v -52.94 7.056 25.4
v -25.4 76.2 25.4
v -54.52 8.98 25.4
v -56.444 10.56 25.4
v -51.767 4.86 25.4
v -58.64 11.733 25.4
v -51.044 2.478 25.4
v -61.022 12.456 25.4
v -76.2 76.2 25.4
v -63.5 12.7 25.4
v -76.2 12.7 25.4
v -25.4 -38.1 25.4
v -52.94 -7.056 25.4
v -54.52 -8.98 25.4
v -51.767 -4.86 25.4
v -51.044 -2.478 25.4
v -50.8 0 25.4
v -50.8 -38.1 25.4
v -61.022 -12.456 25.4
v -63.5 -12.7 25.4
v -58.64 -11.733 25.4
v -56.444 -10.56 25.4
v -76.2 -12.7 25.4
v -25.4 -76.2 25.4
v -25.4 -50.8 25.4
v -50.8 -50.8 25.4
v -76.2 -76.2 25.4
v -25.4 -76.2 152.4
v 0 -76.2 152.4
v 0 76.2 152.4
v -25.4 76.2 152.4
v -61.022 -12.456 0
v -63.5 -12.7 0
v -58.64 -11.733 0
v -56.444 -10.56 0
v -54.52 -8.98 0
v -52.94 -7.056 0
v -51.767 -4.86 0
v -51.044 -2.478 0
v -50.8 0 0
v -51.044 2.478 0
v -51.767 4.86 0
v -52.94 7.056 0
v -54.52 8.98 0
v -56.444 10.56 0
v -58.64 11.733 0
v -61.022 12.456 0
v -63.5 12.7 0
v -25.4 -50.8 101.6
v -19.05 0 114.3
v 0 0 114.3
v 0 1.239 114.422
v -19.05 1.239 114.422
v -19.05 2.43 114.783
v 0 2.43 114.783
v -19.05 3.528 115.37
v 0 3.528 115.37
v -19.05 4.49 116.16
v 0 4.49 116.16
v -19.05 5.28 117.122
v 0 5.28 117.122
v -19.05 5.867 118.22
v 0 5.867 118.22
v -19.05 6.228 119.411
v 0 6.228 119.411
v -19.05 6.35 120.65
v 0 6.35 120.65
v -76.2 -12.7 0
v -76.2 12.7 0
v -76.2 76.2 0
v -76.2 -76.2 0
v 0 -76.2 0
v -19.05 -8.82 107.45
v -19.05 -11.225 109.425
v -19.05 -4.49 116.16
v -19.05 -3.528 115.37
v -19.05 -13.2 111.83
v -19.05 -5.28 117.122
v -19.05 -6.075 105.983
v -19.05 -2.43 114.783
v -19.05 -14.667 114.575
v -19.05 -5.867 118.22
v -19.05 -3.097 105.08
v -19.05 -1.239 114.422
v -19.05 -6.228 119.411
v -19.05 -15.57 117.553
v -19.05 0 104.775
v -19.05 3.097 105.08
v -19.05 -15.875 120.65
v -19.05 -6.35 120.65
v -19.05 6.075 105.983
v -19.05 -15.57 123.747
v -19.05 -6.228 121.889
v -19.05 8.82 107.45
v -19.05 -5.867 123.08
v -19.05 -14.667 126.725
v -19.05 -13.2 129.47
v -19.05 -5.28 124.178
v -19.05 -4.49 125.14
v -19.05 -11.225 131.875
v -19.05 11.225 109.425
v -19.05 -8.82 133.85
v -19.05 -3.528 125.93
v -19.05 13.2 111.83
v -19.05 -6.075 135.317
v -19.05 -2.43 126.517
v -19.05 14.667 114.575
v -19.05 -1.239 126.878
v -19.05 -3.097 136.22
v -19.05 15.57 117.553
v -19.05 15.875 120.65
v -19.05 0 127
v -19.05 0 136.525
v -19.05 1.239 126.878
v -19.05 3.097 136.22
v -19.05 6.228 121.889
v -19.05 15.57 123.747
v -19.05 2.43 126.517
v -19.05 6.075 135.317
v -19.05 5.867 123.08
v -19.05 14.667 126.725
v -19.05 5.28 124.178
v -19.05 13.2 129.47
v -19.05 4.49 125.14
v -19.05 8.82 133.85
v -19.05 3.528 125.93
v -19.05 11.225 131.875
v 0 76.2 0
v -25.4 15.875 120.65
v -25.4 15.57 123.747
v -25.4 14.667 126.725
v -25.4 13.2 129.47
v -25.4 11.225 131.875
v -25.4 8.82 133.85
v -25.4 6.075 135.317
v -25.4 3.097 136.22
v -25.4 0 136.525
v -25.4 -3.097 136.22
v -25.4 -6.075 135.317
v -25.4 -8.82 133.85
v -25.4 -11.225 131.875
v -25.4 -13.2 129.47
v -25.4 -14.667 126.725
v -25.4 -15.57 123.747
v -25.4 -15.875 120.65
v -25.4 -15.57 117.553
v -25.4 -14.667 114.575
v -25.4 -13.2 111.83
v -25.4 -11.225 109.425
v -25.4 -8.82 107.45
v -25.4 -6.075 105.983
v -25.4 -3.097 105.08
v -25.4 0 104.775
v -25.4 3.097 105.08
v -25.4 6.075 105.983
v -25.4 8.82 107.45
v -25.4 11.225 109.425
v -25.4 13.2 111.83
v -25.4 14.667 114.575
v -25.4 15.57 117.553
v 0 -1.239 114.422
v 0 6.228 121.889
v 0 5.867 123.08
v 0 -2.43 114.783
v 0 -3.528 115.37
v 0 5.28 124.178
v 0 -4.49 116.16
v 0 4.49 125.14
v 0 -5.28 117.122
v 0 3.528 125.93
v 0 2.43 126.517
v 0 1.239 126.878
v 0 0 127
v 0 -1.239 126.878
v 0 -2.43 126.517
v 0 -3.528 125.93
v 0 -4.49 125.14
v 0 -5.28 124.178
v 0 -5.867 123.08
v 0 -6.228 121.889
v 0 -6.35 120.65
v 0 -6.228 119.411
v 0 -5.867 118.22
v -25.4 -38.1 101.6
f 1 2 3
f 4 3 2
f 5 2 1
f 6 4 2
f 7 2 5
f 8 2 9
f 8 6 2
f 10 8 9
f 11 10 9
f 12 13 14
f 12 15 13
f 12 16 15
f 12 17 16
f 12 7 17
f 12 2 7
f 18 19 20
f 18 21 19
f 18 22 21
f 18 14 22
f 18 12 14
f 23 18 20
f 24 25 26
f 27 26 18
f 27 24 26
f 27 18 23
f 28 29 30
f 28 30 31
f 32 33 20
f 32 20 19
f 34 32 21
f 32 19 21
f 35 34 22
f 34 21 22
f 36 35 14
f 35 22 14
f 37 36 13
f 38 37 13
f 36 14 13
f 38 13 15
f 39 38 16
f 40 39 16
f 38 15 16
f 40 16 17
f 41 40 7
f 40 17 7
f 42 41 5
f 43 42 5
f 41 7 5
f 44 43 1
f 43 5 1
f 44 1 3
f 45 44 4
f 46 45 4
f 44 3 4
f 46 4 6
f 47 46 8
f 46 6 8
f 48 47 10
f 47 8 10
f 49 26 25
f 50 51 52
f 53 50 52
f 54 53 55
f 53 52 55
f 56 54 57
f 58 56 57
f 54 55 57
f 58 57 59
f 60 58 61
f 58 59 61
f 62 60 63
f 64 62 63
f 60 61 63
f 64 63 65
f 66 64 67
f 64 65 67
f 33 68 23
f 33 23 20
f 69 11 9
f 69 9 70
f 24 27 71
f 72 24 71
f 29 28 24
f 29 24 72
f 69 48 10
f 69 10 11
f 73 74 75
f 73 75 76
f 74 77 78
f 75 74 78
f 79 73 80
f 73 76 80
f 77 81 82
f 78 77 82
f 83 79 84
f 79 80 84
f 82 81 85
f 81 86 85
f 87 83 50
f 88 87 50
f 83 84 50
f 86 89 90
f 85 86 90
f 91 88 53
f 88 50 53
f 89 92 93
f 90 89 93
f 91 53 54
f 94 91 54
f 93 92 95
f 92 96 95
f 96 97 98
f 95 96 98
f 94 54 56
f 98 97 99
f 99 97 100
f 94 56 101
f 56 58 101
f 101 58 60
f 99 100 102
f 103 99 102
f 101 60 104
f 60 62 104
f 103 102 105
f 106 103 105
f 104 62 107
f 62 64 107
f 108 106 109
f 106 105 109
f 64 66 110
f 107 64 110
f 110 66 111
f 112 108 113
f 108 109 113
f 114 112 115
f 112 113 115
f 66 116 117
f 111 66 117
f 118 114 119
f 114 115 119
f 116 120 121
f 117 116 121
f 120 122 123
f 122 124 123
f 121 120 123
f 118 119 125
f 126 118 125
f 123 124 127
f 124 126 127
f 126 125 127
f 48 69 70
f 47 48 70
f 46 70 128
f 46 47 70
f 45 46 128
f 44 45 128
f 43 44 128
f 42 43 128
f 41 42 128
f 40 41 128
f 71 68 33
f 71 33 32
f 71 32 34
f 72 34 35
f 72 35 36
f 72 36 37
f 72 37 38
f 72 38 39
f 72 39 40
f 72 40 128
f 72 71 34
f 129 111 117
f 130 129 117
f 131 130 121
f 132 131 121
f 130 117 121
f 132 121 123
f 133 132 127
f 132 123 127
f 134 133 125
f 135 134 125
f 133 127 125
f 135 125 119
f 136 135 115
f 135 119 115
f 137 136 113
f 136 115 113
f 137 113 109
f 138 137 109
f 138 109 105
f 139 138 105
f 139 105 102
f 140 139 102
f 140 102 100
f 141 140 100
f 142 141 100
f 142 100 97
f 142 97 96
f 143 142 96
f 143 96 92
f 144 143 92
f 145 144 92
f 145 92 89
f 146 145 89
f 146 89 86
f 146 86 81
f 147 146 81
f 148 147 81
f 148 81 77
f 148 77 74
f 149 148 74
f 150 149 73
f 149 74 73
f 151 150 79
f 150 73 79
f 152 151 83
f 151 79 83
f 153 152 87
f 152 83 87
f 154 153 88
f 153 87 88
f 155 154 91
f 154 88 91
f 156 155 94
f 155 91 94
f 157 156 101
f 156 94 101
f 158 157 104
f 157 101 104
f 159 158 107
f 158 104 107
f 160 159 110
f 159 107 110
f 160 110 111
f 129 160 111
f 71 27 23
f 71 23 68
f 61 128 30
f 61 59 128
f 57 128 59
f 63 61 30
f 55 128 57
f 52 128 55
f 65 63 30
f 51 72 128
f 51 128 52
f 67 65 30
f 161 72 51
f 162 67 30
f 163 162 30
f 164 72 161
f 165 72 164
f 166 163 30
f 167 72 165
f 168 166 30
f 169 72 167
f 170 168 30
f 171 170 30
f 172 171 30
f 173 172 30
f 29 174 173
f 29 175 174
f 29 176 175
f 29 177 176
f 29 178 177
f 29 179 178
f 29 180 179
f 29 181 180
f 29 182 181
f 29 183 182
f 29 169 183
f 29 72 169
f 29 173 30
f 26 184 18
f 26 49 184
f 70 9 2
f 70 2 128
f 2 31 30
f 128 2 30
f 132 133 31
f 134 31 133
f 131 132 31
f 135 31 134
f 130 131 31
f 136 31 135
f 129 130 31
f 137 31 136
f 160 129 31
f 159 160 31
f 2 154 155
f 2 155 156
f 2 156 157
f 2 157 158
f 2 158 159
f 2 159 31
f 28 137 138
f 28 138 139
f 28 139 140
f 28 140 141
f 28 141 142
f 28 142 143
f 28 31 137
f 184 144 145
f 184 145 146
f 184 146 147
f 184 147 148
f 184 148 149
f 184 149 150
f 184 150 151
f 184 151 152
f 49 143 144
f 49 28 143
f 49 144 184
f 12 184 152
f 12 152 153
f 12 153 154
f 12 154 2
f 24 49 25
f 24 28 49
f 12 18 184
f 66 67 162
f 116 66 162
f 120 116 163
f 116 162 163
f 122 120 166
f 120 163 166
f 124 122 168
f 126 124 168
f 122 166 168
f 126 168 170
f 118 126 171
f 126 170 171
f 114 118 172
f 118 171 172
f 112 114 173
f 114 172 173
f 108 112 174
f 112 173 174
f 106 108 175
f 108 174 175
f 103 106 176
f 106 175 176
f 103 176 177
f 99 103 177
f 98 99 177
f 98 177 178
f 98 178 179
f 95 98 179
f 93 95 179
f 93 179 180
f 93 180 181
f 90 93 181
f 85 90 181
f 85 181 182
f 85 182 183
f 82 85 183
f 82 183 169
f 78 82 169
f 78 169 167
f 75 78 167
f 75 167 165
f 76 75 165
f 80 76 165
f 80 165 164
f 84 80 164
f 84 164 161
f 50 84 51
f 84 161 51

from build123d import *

# Parameters (mm, degrees)
F1_DEPTH      = 76.2
F3_DEPTH      = 25.4
F3_DEPTH_BACK = 25.4
F5_START      = -19.05
F4_R          = 15.875
F5_DEPTH      = 15.494
F7_DEPTH      = 25.908
F10_DEPTH     = 6.35


with BuildPart() as f1:
    # F0 (on Front) → F1 (new body, symmetric)
    with BuildSketch(Plane.XZ):
        Polygon((-76.2, 0), (0, 0), (0, 152.4), (-25.4, 152.4), (-25.4, 25.4), (-76.2, 25.4), align=None)
    extrude(amount=F1_DEPTH, both=True)

    # F2 (on Right) → F3 (cut, two sides)
    with BuildSketch(Plane.YZ) as f3_sk:
        with BuildLine():
            ThreePointArc((0, 114.3), (4.4901280605, 116.1598719395), (6.35, 120.65))
            ThreePointArc((6.35, 120.65), (-4.4901280605, 125.1401280605), (0, 114.3))
        make_face()
    extrude(amount=-F3_DEPTH, mode=Mode.SUBTRACT)
    extrude(f3_sk.sketch, amount=F3_DEPTH_BACK, mode=Mode.SUBTRACT)

    # F4 (on Right) → F5 (cut)
    with BuildSketch(Plane.YZ.offset(F5_START)):
        with Locations((0, 120.65)):
            Circle(F4_R)
    extrude(amount=-F5_DEPTH, mode=Mode.SUBTRACT)

    # F6 (on Top) → F7 (cut, symmetric)
    with BuildSketch(Plane.XY):
        with BuildLine():
            Line((-76.2, 12.7), (-76.2, 0))
            Line((-76.2, 0), (-76.2, -12.7))
            Line((-76.2, -12.7), (-63.5, -12.7))
            ThreePointArc((-63.5, -12.7), (-50.8, 0), (-63.5, 12.7))
            Line((-63.5, 12.7), (-76.2, 12.7))
        make_face()
    extrude(amount=F7_DEPTH, both=True, mode=Mode.SUBTRACT)

    # F9 (on offset) → F10 (join, symmetric)
    with BuildSketch(Plane.XZ.offset(44.45)):
        Polygon((-50.8, 25.4), (-25.4, 25.4), (-25.4, 101.6), align=None)
    extrude(amount=F10_DEPTH, both=True)


solid = f1.part
